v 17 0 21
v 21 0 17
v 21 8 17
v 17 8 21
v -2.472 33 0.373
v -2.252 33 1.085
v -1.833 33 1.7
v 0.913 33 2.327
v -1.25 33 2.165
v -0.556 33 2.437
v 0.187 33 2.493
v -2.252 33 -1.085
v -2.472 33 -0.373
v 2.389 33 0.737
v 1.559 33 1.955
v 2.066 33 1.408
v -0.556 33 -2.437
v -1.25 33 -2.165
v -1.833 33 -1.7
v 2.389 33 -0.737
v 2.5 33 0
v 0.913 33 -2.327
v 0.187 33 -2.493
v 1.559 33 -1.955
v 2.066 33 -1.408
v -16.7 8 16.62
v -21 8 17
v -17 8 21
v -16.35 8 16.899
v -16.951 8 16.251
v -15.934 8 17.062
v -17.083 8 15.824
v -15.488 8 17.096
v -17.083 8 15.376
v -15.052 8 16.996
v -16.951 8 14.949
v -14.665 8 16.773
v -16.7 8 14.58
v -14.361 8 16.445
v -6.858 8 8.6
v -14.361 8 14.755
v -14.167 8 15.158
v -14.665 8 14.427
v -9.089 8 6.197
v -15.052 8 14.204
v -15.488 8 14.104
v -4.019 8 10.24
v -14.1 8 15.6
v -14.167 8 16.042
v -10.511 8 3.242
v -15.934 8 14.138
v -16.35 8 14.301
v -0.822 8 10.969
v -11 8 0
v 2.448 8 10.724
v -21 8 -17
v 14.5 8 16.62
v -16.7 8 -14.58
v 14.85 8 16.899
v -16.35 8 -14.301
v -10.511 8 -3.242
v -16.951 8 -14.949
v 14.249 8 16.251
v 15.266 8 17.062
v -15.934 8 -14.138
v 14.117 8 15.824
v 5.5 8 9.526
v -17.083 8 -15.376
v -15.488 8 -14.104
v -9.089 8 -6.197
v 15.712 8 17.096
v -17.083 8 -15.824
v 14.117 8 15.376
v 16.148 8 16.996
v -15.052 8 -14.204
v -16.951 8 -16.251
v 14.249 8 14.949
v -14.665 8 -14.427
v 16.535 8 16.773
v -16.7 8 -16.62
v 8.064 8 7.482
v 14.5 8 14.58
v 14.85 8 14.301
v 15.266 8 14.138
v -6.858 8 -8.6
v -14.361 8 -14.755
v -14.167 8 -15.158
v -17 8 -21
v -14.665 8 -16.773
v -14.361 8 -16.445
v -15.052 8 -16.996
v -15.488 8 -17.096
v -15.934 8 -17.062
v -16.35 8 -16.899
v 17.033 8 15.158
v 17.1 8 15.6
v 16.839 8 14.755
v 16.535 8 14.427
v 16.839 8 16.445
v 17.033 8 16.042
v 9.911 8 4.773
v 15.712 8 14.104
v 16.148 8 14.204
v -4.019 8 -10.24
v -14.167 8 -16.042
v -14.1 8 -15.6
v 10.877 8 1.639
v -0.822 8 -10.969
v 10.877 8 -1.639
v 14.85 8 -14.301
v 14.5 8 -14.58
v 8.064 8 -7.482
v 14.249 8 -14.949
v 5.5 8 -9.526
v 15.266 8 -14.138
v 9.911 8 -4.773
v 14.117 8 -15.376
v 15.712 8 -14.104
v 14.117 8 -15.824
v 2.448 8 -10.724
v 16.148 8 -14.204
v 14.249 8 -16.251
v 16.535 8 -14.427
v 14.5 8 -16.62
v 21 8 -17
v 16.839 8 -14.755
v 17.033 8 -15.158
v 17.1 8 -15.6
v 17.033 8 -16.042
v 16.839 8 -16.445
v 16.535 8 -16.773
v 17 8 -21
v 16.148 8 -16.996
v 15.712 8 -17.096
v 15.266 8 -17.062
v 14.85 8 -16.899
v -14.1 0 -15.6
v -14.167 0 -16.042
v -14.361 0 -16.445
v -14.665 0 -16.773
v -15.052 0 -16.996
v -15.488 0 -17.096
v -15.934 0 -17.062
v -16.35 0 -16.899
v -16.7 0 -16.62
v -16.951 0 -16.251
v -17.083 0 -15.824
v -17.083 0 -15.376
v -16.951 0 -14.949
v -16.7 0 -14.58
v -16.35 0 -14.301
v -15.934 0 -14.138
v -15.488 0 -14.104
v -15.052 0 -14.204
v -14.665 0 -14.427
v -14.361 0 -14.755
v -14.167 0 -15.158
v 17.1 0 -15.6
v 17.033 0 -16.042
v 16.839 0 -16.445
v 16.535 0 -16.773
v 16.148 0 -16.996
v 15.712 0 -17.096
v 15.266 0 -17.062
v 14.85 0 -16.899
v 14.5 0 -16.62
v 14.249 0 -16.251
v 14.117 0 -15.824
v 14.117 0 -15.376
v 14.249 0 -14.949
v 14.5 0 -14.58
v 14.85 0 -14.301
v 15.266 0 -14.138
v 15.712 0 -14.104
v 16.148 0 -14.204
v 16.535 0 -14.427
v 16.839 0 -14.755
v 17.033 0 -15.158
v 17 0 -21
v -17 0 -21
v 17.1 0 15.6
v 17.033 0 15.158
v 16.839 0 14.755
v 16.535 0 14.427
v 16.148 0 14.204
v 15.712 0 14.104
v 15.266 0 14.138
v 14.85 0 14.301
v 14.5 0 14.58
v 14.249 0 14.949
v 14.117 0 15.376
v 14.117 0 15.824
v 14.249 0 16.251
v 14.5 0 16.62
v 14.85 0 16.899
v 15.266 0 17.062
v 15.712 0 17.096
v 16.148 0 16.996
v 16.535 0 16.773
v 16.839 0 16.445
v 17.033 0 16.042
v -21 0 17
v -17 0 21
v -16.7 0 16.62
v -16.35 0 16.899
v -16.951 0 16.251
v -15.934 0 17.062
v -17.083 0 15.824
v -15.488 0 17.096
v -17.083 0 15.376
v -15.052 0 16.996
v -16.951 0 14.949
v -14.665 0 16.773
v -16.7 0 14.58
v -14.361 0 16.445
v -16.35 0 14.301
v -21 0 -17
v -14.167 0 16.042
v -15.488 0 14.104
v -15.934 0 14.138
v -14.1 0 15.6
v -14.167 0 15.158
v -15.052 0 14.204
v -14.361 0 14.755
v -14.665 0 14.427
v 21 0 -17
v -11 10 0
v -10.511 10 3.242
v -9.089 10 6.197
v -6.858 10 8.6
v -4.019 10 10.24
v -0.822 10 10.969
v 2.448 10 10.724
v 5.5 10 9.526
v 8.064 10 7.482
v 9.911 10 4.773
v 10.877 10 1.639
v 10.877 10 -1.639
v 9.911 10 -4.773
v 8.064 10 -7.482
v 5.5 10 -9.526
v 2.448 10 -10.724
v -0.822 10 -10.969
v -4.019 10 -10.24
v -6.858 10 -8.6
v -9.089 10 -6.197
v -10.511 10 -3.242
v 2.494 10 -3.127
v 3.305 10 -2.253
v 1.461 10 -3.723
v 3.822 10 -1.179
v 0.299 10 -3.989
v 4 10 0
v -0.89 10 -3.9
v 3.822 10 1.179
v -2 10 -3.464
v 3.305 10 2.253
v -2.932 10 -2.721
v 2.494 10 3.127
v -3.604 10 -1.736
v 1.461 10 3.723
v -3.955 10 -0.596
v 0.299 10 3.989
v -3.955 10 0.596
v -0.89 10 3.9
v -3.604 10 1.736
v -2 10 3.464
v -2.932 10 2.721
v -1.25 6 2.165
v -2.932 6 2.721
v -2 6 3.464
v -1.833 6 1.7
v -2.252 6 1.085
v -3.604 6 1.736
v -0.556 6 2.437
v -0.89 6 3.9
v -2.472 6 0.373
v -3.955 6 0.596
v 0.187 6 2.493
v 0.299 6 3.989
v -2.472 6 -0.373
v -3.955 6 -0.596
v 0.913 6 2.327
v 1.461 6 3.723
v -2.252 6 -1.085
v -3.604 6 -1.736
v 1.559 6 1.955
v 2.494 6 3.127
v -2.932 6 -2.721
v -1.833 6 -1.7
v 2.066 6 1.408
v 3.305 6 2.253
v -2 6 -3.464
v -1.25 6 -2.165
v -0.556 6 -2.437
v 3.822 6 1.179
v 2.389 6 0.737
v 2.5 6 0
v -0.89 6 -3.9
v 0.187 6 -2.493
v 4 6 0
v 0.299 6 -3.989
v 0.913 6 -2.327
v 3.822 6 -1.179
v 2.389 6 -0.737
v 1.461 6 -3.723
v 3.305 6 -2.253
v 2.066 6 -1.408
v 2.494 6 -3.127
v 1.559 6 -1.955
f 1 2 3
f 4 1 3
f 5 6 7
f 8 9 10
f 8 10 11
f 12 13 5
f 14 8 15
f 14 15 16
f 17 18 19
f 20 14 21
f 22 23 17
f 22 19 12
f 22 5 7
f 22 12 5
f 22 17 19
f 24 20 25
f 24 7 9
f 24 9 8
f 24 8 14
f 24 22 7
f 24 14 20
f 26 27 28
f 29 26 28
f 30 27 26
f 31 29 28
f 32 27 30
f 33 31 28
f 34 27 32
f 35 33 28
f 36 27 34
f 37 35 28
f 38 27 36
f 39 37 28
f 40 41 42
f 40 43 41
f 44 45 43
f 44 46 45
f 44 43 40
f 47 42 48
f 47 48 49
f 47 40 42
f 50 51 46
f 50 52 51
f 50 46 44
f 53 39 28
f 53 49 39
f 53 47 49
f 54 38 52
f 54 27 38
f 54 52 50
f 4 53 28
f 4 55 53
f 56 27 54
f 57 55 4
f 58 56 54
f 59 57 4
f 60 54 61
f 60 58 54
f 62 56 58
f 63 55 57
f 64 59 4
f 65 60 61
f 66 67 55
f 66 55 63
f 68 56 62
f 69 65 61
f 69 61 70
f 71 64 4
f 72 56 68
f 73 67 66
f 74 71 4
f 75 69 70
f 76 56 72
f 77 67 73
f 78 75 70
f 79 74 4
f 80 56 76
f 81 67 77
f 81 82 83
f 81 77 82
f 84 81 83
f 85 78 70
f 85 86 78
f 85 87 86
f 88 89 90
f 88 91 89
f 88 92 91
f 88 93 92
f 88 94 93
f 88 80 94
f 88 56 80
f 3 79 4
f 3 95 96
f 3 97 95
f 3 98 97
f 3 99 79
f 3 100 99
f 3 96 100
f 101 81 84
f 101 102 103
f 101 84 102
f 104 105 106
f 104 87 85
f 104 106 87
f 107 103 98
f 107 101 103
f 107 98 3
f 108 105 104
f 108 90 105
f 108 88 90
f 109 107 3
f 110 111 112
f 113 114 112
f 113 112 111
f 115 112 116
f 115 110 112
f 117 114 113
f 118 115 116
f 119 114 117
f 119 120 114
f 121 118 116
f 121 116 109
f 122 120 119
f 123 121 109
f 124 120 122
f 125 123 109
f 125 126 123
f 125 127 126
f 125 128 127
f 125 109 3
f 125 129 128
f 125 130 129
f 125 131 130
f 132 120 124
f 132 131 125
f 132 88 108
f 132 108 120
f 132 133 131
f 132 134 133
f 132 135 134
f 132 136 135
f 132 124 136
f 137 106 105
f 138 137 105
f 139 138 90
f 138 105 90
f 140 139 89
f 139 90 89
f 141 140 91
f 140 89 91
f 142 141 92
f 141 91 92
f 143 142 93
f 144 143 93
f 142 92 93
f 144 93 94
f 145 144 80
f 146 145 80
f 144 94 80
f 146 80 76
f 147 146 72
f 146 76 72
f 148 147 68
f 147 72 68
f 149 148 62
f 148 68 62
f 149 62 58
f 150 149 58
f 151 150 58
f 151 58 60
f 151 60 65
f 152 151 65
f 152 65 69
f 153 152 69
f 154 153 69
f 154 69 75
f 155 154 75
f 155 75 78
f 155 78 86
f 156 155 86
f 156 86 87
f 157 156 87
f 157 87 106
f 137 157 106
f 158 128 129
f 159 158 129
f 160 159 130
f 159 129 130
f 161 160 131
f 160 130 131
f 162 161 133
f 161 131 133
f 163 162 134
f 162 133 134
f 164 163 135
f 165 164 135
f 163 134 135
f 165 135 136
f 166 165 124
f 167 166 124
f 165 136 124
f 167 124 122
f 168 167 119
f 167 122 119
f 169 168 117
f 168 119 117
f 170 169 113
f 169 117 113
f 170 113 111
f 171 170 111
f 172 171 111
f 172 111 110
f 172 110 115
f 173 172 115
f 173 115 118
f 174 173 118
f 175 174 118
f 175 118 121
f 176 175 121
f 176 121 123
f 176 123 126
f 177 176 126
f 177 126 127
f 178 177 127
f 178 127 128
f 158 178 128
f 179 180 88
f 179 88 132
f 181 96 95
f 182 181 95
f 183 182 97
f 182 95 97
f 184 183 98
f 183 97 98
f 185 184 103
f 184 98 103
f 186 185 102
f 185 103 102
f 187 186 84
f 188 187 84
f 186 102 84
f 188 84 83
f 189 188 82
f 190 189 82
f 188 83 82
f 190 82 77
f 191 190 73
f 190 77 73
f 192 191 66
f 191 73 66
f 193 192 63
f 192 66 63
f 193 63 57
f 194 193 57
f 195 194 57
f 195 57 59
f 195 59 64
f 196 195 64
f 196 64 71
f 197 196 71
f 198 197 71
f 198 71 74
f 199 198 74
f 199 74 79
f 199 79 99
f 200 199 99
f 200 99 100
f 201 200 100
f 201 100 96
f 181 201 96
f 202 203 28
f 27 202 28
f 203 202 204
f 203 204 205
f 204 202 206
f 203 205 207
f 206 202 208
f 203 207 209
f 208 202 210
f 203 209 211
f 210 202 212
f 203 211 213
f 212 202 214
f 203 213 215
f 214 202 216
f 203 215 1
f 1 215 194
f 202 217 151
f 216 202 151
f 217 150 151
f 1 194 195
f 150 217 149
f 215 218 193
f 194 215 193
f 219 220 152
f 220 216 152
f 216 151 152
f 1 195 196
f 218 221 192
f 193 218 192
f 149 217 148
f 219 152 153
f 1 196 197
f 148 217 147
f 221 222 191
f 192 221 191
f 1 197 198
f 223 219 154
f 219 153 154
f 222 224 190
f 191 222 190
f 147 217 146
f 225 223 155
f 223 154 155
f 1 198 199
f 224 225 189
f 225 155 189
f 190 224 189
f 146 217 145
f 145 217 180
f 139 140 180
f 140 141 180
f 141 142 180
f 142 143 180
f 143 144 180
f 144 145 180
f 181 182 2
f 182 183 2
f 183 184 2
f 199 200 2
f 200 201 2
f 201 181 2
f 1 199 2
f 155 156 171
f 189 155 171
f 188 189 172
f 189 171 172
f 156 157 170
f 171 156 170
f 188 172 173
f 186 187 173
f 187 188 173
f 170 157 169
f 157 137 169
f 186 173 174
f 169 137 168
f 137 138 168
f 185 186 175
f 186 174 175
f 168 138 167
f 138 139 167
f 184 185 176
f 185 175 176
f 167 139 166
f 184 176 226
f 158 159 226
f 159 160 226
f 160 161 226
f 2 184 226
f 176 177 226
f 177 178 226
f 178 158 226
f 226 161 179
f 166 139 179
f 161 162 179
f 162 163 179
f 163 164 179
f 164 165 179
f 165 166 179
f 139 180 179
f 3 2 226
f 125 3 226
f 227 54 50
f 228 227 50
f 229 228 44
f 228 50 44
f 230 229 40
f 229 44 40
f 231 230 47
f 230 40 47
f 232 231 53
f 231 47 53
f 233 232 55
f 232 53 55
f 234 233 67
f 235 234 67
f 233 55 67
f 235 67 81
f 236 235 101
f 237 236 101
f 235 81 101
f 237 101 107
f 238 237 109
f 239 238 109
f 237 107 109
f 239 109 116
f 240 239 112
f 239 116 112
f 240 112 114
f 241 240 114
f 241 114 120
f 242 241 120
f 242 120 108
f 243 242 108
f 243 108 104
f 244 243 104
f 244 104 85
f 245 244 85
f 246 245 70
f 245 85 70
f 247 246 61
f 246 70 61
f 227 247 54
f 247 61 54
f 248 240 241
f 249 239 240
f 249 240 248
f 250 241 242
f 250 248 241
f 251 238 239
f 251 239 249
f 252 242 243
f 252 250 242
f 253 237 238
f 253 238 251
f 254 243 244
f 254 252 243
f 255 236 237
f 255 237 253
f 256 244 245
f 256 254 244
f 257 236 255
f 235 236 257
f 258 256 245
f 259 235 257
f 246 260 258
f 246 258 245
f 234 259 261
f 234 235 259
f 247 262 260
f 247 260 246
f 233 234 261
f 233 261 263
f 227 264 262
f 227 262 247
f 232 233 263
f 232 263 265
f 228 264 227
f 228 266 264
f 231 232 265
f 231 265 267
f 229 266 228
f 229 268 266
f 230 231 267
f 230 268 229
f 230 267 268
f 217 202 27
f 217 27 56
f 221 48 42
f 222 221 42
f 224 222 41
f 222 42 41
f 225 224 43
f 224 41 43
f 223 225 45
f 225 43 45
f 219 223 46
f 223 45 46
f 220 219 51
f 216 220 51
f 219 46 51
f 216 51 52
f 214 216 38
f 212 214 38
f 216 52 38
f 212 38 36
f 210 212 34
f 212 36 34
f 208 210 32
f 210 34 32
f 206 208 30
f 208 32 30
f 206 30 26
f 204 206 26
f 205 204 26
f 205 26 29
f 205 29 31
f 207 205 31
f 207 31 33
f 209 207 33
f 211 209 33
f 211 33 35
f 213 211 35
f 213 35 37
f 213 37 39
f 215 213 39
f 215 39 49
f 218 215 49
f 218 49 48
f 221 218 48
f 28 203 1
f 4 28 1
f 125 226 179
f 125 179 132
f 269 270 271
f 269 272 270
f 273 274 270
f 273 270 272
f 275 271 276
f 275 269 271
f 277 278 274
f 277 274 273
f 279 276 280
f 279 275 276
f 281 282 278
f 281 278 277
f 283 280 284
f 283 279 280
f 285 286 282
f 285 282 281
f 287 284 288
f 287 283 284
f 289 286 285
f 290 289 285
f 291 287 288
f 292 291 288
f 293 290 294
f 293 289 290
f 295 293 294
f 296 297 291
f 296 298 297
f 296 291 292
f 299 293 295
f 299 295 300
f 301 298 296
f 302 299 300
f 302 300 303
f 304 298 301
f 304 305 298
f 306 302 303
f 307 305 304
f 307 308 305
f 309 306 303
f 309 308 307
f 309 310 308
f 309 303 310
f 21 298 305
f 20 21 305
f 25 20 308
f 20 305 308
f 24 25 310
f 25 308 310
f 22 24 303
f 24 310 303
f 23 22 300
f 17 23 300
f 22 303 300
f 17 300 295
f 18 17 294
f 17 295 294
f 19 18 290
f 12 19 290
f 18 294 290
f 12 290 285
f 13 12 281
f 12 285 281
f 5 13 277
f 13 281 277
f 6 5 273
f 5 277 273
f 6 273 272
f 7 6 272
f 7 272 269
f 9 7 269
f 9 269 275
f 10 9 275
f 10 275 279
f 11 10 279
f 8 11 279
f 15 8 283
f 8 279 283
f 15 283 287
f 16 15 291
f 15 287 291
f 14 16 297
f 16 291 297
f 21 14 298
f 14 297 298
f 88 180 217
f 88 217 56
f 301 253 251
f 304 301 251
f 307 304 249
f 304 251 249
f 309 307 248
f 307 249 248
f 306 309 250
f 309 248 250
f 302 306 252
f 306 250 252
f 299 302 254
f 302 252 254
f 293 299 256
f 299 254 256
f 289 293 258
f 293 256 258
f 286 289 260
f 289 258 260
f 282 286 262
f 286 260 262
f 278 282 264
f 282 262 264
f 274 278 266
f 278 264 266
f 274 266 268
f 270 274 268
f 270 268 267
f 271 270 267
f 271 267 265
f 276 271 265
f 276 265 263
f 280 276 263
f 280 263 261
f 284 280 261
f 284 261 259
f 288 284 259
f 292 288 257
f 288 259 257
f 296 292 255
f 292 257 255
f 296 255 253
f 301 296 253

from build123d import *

# Parameters (mm, degrees)
SKETCH1_W               = 42
SKETCH1_H               = 42
BOSS_EXTRUDE1_DEPTH     = 8
SKETCH2_R               = 11
BOSS_EXTRUDE2_DEPTH     = 2
SKETCH3_R               = 4
CUT_EXTRUDE1_DEPTH      = 4
SKETCH4_R               = 2.5
BOSS_EXTRUDE3_DEPTH     = 27
CHAMFER1_SIZE           = 4
SKETCH5_R               = 1.5
CUT_EXTRUDE2_DEPTH      = 26
CUT_EXTRUDE2_DEPTH_BACK = 9


with BuildPart() as part:
    # Sketch1 → Boss-Extrude1 (new body)
    with BuildSketch(Plane(origin=(0, 0, 0), x_dir=(1, 0, 0), z_dir=(0, 1, 0))):
        Rectangle(SKETCH1_W, SKETCH1_H)
    extrude(amount=BOSS_EXTRUDE1_DEPTH)

    # Sketch2 → Boss-Extrude2 (add)
    with BuildSketch(Plane(origin=(0, 8, 0), x_dir=(-1, 0, 0), z_dir=(0, 1, 0))):
        Circle(SKETCH2_R)
    extrude(amount=BOSS_EXTRUDE2_DEPTH)

    # Sketch3 → Cut-Extrude1 (cut)
    with BuildSketch(Plane(origin=(0, 10, 0), x_dir=(1, 0, 0), z_dir=(0, 1, 0))):
        Circle(SKETCH3_R)
    extrude(amount=-CUT_EXTRUDE1_DEPTH, mode=Mode.SUBTRACT)

    # Sketch4 → Boss-Extrude3 (add)
    with BuildSketch(Plane(origin=(0, 6, 0), x_dir=(1, 0, 0), z_dir=(0, 1, 0))):
        Circle(SKETCH4_R)
    extrude(amount=BOSS_EXTRUDE3_DEPTH)

    # Chamfer1
    chamfer1_edges = [part.edges().sort_by_distance(p)[0] for p in [
        (-21, 4, -21),
        (21, 4, -21),
        (21, 4, 21),
        (-21, 4, 21),
    ]]
    chamfer(chamfer1_edges, length=CHAMFER1_SIZE)

    # Sketch5 → Cut-Extrude2 (cut, two sides)
    with BuildSketch(Plane(origin=(0, 8, 0), x_dir=(1, 0, 0), z_dir=(0, 1, 0))) as cut_extrude2_sk:
        with Locations((-15.6, 15.6)):
            Circle(SKETCH5_R)
        with Locations((15.6, 15.6)):
            Circle(SKETCH5_R)
        with Locations((15.6, -15.6)):
            Circle(SKETCH5_R)
        with Locations((-15.6, -15.6)):
            Circle(SKETCH5_R)
    extrude(amount=CUT_EXTRUDE2_DEPTH, mode=Mode.SUBTRACT)
    extrude(cut_extrude2_sk.sketch, amount=-CUT_EXTRUDE2_DEPTH_BACK, mode=Mode.SUBTRACT)


solid = part.part
